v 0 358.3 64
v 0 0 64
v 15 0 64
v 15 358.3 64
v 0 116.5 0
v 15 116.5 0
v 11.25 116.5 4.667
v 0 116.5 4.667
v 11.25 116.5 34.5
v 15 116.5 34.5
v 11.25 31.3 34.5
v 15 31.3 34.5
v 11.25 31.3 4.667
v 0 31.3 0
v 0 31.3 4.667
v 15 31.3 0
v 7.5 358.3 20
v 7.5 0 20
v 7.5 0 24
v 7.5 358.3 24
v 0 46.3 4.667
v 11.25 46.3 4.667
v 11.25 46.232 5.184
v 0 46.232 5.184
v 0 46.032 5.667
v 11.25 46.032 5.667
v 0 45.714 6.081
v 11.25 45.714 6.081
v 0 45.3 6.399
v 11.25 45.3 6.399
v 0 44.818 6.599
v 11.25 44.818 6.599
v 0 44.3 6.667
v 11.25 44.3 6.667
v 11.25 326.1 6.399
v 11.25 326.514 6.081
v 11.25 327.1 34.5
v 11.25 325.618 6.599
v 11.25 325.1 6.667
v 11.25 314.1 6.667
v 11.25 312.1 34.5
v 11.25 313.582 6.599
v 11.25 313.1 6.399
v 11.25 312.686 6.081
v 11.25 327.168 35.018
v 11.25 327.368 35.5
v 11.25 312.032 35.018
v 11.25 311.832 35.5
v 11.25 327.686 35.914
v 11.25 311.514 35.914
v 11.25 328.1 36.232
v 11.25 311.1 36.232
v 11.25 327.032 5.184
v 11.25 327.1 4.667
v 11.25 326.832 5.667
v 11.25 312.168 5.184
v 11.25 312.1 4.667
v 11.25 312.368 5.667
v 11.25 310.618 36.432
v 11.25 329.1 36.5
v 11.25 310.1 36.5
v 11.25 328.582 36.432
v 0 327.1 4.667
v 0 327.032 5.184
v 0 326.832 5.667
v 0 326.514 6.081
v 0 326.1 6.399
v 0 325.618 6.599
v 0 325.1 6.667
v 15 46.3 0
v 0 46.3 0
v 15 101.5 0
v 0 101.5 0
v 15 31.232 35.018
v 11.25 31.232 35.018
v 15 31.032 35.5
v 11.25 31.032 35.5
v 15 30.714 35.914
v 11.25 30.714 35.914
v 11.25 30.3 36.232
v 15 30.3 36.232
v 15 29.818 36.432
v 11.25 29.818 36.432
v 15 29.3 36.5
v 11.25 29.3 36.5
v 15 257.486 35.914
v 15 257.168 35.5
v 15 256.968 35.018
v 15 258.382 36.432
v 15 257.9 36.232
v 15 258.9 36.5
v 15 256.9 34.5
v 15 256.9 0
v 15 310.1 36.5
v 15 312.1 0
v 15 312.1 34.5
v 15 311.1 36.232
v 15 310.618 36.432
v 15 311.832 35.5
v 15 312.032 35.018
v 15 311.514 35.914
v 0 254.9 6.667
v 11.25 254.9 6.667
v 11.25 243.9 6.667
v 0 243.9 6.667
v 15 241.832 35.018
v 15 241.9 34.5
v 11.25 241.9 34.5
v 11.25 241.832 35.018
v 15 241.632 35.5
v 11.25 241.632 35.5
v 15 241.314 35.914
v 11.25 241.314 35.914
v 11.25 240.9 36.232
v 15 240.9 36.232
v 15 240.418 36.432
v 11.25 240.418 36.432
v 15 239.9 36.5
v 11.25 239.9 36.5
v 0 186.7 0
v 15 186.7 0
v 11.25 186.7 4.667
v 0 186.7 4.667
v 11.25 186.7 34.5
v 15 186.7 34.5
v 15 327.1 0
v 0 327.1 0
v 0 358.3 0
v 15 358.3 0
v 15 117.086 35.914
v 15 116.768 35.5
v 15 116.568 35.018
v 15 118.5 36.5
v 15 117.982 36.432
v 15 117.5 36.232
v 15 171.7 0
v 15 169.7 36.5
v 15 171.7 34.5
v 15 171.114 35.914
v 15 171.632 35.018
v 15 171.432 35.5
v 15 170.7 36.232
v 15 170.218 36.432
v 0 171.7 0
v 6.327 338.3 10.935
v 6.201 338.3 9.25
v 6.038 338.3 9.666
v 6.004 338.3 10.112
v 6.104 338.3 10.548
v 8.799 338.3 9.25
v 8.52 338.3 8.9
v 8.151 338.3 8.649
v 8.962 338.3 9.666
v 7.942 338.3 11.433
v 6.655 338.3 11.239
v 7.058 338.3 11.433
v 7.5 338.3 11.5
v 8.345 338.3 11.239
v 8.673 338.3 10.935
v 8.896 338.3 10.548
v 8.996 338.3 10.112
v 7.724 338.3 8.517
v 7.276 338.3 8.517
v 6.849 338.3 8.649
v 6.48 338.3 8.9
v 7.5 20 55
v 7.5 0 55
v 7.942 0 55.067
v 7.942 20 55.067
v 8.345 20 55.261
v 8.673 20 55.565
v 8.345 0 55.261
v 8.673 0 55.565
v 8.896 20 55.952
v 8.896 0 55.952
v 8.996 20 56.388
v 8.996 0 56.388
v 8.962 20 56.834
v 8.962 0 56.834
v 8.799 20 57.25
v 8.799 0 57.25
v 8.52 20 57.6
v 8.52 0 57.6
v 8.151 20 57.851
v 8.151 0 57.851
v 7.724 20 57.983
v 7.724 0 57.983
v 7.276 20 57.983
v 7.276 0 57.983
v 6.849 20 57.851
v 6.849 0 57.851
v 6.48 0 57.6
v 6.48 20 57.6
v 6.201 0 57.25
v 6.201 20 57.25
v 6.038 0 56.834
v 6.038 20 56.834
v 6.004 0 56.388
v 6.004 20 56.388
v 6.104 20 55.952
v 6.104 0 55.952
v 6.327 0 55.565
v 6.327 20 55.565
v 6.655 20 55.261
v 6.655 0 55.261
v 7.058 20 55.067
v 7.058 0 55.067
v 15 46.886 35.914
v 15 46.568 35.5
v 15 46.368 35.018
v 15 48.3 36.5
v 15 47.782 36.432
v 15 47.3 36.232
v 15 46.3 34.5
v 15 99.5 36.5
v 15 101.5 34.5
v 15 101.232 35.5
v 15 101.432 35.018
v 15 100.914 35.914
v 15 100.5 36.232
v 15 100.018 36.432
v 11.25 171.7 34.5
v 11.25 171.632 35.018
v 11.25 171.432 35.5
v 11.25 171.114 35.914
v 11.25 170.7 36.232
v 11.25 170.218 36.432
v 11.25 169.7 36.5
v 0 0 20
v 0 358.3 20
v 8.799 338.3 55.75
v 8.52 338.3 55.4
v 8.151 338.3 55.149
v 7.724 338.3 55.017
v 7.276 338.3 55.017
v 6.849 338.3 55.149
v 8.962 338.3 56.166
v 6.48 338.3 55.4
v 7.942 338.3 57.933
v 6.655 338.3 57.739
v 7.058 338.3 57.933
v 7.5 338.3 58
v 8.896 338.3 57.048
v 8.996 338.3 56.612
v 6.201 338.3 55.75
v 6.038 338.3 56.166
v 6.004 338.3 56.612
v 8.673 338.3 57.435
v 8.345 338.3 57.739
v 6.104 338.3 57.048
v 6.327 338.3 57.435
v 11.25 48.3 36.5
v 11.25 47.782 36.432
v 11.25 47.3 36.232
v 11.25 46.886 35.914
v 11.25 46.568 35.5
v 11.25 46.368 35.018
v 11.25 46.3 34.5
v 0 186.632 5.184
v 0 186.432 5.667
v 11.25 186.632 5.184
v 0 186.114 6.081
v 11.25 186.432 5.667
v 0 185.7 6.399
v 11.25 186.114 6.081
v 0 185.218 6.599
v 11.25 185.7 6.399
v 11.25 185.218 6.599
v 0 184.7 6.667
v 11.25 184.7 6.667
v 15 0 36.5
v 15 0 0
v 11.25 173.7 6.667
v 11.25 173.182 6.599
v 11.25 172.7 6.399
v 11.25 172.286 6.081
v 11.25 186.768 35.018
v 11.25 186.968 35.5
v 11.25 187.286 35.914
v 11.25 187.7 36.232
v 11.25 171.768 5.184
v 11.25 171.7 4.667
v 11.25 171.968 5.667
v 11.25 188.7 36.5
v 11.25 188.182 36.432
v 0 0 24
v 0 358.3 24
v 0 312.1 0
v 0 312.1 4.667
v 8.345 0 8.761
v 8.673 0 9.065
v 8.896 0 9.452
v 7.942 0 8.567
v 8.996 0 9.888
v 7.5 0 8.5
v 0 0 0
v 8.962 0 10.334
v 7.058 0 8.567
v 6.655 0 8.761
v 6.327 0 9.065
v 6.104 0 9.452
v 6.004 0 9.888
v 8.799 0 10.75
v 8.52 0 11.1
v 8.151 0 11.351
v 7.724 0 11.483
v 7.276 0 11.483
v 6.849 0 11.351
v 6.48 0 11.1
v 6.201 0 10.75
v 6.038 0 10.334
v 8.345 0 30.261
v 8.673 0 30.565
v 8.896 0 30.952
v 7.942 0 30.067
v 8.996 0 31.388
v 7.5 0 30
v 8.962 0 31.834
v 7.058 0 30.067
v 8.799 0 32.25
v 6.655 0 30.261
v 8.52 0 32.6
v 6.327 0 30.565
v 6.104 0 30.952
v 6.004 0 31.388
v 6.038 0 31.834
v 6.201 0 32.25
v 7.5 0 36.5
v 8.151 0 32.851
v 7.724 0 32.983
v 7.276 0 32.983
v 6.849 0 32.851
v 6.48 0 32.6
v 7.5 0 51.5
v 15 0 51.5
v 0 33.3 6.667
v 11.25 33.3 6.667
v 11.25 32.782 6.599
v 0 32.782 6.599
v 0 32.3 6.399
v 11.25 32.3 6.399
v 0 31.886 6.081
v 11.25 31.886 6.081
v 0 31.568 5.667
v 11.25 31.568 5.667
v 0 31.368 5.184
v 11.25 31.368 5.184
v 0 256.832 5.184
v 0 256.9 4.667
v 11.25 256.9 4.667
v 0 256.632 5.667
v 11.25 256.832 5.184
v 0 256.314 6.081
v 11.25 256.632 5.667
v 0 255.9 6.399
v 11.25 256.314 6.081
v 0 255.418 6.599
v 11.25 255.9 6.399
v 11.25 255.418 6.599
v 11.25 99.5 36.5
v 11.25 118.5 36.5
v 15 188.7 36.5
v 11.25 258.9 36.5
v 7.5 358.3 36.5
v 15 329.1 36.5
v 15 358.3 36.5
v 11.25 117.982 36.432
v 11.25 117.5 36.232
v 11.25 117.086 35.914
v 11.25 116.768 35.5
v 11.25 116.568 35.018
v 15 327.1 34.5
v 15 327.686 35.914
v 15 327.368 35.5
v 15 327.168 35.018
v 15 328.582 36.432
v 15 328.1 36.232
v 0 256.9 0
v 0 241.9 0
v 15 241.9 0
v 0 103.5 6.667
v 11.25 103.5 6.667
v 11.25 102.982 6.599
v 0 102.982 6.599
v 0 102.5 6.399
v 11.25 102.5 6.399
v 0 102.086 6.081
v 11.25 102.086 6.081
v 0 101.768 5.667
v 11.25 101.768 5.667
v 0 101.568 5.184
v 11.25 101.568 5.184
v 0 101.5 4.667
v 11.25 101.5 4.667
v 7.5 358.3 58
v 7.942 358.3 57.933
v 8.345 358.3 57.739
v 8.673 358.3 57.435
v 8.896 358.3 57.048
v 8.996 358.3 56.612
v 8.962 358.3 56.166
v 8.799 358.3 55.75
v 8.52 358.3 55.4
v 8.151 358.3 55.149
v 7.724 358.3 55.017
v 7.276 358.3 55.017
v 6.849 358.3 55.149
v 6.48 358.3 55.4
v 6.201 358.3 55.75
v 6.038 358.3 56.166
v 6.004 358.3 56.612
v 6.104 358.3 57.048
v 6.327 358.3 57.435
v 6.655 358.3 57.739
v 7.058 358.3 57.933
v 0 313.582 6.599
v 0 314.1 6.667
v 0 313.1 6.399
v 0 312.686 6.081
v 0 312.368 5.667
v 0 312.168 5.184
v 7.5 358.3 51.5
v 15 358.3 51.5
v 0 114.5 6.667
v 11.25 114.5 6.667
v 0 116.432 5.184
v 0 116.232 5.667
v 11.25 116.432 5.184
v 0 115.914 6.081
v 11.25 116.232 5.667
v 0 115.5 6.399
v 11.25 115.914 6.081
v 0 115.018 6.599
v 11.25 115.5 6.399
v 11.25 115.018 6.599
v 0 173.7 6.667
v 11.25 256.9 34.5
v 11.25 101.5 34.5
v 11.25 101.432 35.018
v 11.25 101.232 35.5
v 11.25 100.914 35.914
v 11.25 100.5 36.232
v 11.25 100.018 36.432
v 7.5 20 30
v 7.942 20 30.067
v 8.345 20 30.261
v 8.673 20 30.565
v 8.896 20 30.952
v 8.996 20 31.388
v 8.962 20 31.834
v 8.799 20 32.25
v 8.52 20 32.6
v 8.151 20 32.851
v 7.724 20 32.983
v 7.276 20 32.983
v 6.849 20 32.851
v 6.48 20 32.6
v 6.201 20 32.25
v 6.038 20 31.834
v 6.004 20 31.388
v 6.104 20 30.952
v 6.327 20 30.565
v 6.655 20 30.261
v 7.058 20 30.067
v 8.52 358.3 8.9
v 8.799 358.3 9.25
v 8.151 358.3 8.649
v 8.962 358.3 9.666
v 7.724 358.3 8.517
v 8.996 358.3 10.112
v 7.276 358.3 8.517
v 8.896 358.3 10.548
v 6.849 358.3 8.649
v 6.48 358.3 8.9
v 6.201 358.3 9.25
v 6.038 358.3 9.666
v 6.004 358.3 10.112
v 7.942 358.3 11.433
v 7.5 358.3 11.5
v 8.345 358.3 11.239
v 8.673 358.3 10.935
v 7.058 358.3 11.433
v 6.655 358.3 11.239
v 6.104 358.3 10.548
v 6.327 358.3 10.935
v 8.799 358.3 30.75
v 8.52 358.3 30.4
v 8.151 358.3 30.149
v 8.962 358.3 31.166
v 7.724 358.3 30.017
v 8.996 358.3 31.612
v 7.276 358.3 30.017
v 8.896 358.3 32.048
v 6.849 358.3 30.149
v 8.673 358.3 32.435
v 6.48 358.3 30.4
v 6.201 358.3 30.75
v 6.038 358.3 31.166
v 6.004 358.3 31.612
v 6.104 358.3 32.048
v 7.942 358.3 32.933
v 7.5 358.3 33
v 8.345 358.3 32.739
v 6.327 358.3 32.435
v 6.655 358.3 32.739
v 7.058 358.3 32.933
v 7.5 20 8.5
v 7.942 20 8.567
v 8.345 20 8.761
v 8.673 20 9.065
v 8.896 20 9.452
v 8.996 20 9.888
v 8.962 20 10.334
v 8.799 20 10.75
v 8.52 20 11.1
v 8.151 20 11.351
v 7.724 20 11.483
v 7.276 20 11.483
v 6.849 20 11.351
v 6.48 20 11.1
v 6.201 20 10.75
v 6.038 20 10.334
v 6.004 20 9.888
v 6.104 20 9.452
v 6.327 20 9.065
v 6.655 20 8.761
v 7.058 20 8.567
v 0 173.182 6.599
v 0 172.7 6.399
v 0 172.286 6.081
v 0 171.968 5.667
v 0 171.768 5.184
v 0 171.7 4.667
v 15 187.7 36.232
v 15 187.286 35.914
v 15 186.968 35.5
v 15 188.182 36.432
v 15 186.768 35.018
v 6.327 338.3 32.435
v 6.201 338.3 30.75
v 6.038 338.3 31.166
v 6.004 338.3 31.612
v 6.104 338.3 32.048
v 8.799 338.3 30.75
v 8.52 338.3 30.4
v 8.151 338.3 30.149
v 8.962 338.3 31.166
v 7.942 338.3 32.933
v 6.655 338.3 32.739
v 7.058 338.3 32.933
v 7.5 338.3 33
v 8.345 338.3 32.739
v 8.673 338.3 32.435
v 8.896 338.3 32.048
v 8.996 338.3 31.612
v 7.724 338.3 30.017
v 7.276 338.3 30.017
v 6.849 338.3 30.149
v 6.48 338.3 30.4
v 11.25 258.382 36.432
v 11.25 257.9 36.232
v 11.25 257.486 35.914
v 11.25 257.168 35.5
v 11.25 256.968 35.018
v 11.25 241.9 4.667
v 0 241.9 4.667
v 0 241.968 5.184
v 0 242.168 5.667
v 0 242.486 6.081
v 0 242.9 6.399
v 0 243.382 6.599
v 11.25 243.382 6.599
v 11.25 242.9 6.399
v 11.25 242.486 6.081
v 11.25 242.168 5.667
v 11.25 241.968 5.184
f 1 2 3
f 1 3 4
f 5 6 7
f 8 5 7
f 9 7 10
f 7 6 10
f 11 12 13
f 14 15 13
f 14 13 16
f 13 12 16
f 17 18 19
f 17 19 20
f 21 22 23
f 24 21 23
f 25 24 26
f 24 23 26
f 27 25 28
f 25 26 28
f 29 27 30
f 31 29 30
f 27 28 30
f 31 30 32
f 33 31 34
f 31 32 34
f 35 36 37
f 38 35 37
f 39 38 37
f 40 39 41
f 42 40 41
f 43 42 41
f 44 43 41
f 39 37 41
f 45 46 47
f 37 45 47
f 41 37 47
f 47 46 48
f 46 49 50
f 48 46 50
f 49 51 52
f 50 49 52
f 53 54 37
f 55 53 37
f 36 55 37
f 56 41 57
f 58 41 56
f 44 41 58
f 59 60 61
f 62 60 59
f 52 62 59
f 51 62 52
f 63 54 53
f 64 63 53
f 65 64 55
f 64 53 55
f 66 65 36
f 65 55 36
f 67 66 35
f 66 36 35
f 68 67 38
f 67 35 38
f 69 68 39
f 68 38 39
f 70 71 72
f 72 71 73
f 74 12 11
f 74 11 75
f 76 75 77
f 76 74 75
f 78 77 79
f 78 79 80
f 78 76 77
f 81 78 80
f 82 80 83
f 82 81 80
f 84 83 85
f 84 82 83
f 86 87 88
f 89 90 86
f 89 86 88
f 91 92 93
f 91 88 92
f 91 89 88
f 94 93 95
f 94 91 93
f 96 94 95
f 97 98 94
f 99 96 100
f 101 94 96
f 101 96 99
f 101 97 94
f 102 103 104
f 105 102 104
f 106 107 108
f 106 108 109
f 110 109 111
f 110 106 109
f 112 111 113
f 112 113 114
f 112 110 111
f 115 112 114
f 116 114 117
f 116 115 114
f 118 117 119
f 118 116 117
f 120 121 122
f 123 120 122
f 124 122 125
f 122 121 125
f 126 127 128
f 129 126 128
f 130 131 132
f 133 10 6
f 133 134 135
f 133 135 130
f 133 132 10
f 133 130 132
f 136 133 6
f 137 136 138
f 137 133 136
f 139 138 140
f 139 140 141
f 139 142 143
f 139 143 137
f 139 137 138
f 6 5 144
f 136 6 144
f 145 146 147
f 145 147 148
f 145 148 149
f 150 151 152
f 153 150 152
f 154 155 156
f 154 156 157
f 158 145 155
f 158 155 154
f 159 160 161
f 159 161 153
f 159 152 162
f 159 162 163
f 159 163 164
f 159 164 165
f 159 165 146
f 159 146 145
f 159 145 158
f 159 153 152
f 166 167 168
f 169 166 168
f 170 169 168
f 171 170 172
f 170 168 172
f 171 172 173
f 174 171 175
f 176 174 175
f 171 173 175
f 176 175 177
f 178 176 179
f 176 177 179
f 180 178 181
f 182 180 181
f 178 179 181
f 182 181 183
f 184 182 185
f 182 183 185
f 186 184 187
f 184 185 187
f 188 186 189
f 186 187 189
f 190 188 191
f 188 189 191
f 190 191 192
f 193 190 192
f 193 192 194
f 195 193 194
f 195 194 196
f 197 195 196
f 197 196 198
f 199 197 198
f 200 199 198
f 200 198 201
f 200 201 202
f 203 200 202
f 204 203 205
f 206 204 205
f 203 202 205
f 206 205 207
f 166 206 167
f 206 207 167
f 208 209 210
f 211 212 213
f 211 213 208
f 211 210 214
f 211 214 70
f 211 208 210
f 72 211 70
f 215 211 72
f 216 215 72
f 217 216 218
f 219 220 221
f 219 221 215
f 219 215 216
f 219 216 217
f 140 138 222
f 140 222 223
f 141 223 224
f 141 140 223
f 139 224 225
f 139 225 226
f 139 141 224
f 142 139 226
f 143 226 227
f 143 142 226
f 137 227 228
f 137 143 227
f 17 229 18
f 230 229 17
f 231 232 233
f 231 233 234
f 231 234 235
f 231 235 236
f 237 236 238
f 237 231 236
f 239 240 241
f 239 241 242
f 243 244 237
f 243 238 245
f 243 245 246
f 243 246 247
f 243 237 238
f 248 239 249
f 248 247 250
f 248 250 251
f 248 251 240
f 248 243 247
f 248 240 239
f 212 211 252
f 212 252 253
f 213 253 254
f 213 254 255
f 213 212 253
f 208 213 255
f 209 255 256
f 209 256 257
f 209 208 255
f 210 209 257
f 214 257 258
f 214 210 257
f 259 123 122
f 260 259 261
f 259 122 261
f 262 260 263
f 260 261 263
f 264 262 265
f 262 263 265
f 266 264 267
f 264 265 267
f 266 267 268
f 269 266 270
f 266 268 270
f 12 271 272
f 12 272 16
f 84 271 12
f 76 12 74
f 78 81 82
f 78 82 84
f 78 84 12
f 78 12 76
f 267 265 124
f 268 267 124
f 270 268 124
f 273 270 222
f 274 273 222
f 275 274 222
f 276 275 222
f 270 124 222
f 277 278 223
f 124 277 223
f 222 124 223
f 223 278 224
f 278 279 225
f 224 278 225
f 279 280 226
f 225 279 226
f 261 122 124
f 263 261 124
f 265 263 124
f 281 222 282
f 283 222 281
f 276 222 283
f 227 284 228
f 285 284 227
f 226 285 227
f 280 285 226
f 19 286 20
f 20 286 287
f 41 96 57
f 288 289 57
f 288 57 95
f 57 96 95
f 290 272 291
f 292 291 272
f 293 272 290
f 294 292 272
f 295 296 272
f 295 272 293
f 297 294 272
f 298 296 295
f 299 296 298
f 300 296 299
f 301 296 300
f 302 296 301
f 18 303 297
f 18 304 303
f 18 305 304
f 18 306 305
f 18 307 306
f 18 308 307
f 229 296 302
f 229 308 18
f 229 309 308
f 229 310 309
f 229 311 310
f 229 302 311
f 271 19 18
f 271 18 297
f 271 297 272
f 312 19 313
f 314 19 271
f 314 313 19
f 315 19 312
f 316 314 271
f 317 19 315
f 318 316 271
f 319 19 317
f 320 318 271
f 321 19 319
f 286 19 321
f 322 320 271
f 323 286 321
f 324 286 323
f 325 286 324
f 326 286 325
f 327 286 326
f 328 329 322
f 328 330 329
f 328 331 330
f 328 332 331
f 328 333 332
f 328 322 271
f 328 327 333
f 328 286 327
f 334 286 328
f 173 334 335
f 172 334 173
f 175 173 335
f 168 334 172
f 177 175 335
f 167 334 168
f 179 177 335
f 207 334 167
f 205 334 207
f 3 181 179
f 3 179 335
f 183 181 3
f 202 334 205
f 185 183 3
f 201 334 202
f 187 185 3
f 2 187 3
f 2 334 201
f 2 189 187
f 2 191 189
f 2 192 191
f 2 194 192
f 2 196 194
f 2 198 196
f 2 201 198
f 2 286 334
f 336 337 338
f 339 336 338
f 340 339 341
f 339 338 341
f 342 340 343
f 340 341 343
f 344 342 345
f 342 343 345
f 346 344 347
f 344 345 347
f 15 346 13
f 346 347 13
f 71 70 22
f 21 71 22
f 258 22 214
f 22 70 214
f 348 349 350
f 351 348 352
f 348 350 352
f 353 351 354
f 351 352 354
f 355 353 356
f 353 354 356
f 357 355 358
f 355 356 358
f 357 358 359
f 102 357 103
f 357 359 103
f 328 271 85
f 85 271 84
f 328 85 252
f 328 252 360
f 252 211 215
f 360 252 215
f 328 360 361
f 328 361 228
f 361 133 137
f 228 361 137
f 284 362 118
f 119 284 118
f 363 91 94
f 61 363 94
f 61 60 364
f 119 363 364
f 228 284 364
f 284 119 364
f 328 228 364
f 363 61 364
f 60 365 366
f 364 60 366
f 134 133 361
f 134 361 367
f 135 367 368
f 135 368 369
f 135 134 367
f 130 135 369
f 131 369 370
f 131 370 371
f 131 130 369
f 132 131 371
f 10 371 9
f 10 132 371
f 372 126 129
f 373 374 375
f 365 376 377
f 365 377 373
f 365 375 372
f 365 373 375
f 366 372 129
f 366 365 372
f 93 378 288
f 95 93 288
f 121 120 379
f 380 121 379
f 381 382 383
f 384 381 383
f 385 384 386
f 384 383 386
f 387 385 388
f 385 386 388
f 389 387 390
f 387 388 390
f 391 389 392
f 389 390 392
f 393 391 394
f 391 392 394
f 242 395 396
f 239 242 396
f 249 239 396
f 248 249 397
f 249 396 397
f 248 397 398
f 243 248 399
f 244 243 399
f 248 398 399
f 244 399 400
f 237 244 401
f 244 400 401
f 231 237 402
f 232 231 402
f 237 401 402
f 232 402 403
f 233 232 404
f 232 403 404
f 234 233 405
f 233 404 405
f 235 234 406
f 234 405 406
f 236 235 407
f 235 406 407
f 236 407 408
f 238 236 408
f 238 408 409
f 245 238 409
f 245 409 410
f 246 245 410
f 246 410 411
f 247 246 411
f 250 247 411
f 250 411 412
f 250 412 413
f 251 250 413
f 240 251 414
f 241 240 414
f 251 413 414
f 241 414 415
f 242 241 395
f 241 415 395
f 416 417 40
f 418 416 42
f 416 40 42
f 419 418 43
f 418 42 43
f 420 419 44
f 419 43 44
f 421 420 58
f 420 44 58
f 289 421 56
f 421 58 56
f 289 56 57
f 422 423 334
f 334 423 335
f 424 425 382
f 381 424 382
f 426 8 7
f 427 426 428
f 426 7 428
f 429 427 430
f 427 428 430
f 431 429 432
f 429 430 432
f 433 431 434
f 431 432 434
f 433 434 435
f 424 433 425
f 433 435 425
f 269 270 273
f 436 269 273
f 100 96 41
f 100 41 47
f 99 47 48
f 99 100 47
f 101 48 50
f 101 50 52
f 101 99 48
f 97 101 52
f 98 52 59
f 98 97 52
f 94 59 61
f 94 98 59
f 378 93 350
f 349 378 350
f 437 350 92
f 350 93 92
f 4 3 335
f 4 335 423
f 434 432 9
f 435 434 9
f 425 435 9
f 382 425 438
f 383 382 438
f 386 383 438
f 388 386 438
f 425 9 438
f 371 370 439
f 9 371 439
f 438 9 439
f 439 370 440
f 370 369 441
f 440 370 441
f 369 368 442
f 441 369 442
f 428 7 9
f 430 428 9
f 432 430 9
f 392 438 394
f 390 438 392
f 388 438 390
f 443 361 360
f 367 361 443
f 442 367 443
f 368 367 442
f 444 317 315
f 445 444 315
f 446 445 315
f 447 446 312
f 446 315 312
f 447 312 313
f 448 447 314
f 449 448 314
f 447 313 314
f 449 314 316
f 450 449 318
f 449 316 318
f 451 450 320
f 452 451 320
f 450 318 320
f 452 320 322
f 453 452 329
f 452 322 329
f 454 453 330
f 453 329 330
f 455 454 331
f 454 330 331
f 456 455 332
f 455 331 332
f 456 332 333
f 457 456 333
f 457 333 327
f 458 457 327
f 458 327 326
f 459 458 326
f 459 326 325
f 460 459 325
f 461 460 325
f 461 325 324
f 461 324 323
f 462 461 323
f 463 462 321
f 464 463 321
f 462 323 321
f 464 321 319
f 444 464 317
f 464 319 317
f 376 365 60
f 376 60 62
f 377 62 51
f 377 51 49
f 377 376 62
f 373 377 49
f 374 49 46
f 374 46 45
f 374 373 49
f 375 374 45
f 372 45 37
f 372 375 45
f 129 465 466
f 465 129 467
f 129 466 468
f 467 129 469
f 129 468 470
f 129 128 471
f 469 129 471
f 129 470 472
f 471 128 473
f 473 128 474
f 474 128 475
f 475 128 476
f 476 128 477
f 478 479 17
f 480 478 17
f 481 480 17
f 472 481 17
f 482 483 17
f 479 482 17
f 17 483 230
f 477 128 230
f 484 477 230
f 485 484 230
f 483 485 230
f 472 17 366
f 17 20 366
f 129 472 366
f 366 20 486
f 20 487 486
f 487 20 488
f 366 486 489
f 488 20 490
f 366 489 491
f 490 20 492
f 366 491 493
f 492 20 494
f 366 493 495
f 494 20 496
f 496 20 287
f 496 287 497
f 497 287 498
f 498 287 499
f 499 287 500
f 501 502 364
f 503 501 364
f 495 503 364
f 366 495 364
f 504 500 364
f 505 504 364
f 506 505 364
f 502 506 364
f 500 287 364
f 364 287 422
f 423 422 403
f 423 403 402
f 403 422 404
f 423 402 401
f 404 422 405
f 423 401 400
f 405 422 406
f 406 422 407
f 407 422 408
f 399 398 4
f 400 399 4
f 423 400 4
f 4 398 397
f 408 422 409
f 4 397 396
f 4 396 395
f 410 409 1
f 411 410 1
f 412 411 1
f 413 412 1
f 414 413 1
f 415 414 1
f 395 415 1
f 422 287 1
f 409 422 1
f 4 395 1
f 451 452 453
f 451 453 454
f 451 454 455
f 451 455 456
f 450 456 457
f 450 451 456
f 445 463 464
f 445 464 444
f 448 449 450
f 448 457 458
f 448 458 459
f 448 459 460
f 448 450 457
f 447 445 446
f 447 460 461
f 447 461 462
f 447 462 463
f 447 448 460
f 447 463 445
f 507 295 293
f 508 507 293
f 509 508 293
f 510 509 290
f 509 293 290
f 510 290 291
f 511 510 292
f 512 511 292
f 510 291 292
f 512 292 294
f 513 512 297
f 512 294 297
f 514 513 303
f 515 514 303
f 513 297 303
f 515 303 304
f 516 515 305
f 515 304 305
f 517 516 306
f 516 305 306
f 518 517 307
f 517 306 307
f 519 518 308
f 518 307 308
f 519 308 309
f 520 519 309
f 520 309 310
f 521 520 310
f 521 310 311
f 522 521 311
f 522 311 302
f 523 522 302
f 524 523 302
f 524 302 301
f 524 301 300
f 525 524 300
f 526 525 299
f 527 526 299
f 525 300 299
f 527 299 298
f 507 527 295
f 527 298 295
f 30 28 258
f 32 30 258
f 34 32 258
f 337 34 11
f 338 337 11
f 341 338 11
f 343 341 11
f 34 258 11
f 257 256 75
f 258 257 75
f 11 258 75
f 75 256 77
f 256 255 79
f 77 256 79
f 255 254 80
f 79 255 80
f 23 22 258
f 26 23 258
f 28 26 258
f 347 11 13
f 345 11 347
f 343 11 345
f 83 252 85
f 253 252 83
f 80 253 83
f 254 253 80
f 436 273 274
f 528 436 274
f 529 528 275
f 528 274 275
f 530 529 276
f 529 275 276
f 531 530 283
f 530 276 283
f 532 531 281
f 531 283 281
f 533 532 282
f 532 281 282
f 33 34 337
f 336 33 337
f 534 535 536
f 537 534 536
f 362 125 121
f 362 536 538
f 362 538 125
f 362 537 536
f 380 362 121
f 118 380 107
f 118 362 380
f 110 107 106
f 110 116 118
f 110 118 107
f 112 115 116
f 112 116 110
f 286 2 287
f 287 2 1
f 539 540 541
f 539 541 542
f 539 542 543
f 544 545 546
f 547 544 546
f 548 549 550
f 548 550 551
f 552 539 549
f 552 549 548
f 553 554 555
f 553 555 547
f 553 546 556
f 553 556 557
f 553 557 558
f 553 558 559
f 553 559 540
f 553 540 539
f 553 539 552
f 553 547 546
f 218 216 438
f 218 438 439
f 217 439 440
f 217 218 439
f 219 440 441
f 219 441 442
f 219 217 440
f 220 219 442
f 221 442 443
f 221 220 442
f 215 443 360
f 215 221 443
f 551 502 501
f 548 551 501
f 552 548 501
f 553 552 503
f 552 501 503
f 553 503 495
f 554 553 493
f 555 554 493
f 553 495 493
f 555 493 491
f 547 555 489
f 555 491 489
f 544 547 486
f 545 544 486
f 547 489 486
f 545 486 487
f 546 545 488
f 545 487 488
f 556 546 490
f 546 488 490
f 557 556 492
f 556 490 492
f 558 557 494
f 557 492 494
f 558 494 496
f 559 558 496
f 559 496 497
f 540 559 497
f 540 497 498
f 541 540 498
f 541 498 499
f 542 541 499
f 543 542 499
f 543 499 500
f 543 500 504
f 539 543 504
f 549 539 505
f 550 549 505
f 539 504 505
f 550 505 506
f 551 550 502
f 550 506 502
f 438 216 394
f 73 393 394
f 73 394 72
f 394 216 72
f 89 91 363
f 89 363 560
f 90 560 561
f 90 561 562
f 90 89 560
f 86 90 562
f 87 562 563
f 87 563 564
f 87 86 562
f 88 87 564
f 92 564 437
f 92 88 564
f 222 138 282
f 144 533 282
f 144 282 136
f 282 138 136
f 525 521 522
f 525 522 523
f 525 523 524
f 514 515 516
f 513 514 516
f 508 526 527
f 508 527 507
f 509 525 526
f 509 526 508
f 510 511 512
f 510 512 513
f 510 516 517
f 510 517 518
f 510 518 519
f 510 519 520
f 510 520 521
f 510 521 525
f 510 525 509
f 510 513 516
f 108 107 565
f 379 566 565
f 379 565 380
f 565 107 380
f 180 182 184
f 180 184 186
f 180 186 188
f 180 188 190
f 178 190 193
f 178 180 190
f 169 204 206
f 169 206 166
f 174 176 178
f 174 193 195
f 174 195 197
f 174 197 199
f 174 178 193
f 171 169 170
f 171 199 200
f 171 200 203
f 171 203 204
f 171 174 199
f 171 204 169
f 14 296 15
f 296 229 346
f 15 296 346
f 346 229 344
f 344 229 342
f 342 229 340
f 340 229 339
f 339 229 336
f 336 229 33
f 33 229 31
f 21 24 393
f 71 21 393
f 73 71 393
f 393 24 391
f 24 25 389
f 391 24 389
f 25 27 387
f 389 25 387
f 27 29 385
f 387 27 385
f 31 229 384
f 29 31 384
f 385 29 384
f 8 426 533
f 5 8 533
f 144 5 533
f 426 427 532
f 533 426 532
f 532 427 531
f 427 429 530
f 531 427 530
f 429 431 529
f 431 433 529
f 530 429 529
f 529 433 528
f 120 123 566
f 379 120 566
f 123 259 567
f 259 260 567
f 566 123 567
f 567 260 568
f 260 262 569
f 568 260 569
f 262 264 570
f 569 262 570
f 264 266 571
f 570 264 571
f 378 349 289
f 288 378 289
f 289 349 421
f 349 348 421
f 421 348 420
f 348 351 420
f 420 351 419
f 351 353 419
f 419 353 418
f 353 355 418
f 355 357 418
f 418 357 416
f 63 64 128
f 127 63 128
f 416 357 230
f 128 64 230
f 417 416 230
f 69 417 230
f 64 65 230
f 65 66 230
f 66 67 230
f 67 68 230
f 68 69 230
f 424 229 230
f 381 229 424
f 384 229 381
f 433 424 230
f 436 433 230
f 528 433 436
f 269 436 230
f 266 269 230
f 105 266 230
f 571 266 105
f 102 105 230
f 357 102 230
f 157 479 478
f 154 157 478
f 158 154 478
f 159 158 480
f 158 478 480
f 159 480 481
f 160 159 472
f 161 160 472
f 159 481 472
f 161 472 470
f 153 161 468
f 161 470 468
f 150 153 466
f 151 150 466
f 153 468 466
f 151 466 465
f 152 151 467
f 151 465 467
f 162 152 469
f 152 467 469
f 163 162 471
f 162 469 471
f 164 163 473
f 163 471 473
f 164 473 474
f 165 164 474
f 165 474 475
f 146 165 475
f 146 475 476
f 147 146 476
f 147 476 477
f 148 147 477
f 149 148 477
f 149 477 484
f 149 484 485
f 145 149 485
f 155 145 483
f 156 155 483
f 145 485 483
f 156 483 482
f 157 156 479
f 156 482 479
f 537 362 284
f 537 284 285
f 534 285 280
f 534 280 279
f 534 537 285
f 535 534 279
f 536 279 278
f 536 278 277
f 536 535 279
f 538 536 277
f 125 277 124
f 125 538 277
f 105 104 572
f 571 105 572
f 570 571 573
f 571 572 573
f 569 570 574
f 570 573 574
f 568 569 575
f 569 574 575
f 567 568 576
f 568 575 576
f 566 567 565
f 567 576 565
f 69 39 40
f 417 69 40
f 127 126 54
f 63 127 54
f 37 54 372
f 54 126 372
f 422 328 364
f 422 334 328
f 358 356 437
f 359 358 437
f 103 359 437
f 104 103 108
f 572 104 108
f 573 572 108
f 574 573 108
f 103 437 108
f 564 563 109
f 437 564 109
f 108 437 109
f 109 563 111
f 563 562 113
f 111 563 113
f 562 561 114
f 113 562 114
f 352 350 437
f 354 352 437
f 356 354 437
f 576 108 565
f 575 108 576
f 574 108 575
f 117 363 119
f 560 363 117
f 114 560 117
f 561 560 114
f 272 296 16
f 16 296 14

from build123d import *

# Parameters (mm, degrees)
SKETCH_W               = 358.3
SKETCH_H               = 64
PAD_DEPTH              = 15
SKETCH001_W            = 358.3
SKETCH001_H            = 4
POCKET_DEPTH           = 7.5
SKETCH002_R            = 1.5
POCKET001_DEPTH        = 20
SKETCH003_R            = 1.5
POCKET002_DEPTH        = 20
POCKET003_DEPTH        = 7.5
POCKET004_DEPTH        = 3.75
LINEARPATTERN_COUNT    = 5
LINEARPATTERN_PITCH    = 70.2
POCKET005_DEPTH        = 739.810922
LINEARPATTERN001_COUNT = 5
LINEARPATTERN001_PITCH = 70.2


with BuildPart() as part:
    # Sketch → Pad (new body)
    with BuildSketch(Plane.YZ):
        with Locations((179.15, 32)):
            Rectangle(SKETCH_W, SKETCH_H)
    extrude(amount=PAD_DEPTH)

    # Sketch001 (on Face5 of Pad) → Pocket (cut)
    with BuildSketch(Plane(origin=(0, 0, 0), x_dir=(0, 1, 0), z_dir=(-1, 0, 0))):
        with Locations((179.15, -22)):
            Rectangle(SKETCH001_W, SKETCH001_H)
    extrude(amount=-POCKET_DEPTH, mode=Mode.SUBTRACT)

    # Sketch002 (on Face3 of Pocket) → Pocket001 (cut)
    with BuildSketch(Plane(origin=(0, 0, 0), x_dir=(0, 0, -1), z_dir=(0, -1, 0))):
        with Locations((-56.5, 7.5)):
            Circle(SKETCH002_R)
        with Locations((-31.5, 7.5)):
            Circle(SKETCH002_R)
        with Locations((-10, 7.5)):
            Circle(SKETCH002_R)
    extrude(amount=-POCKET001_DEPTH, mode=Mode.SUBTRACT)

    # Sketch003 (on Face2 of Pocket001) → Pocket002 (cut)
    with BuildSketch(Plane.ZX.offset(358.3)):
        with Locations((10, 7.5)):
            Circle(SKETCH003_R)
        with Locations((31.5, 7.5)):
            Circle(SKETCH003_R)
        with Locations((56.5, 7.5)):
            Circle(SKETCH003_R)
    extrude(amount=-POCKET002_DEPTH, mode=Mode.SUBTRACT)

    # Sketch004 (on Face5 of Pocket002) → Pocket003 (cut)
    with BuildSketch(Plane.YZ.offset(15)):
        Polygon((0, 36.5), (358.3, 36.5), (358.3, 51.5), (0, 51.5), (0, 44), align=None)
    extrude(amount=-POCKET003_DEPTH, mode=Mode.SUBTRACT)

    # Sketch005 (on Face5 of Pocket003) → Pocket004 (cut)
    with BuildSketch(Plane.YZ.offset(15)):
        with BuildLine():
            Line((46.3, 34.5), (46.3, 0))
            Line((46.3, 0), (31.3, 0))
            Line((31.3, 0), (31.3, 34.5))
            ThreePointArc((31.3, 34.5), (30.714214, 35.914214), (29.3, 36.5))
            Line((29.3, 36.5), (48.3, 36.5))
            ThreePointArc((48.3, 36.5), (46.885786, 35.914214), (46.3, 34.5))
        make_face()
    pocket004 = extrude(amount=-POCKET004_DEPTH, mode=Mode.SUBTRACT)

    # LinearPattern: Pocket004 ×5
    with Locations(*[(0, i * LINEARPATTERN_PITCH, 0) for i in range(1, LINEARPATTERN_COUNT)]):
        add(pocket004, mode=Mode.SUBTRACT)

    # Sketch006 (on Face6 of MultiTransform) → Pocket005 (cut, through all)
    with BuildSketch(Plane.YZ.offset(11.25)):
        with BuildLine():
            Line((31.3, 0), (46.3, 0))
            Line((46.3, 0), (46.3, 4.666667))
            ThreePointArc((46.3, 4.666667), (45.714214, 6.08088), (44.3, 6.666667))
            Line((44.3, 6.666667), (33.3, 6.666667))
            ThreePointArc((33.3, 6.666667), (31.885786, 6.08088), (31.3, 4.666667))
            Line((31.3, 4.666667), (31.3, 0))
        make_face()
    pocket005 = extrude(amount=-POCKET005_DEPTH, mode=Mode.SUBTRACT)

    # LinearPattern001: Pocket005 ×5
    with Locations(*[(0, i * LINEARPATTERN001_PITCH, 0) for i in range(1, LINEARPATTERN001_COUNT)]):
        add(pocket005, mode=Mode.SUBTRACT)


solid = part.part
